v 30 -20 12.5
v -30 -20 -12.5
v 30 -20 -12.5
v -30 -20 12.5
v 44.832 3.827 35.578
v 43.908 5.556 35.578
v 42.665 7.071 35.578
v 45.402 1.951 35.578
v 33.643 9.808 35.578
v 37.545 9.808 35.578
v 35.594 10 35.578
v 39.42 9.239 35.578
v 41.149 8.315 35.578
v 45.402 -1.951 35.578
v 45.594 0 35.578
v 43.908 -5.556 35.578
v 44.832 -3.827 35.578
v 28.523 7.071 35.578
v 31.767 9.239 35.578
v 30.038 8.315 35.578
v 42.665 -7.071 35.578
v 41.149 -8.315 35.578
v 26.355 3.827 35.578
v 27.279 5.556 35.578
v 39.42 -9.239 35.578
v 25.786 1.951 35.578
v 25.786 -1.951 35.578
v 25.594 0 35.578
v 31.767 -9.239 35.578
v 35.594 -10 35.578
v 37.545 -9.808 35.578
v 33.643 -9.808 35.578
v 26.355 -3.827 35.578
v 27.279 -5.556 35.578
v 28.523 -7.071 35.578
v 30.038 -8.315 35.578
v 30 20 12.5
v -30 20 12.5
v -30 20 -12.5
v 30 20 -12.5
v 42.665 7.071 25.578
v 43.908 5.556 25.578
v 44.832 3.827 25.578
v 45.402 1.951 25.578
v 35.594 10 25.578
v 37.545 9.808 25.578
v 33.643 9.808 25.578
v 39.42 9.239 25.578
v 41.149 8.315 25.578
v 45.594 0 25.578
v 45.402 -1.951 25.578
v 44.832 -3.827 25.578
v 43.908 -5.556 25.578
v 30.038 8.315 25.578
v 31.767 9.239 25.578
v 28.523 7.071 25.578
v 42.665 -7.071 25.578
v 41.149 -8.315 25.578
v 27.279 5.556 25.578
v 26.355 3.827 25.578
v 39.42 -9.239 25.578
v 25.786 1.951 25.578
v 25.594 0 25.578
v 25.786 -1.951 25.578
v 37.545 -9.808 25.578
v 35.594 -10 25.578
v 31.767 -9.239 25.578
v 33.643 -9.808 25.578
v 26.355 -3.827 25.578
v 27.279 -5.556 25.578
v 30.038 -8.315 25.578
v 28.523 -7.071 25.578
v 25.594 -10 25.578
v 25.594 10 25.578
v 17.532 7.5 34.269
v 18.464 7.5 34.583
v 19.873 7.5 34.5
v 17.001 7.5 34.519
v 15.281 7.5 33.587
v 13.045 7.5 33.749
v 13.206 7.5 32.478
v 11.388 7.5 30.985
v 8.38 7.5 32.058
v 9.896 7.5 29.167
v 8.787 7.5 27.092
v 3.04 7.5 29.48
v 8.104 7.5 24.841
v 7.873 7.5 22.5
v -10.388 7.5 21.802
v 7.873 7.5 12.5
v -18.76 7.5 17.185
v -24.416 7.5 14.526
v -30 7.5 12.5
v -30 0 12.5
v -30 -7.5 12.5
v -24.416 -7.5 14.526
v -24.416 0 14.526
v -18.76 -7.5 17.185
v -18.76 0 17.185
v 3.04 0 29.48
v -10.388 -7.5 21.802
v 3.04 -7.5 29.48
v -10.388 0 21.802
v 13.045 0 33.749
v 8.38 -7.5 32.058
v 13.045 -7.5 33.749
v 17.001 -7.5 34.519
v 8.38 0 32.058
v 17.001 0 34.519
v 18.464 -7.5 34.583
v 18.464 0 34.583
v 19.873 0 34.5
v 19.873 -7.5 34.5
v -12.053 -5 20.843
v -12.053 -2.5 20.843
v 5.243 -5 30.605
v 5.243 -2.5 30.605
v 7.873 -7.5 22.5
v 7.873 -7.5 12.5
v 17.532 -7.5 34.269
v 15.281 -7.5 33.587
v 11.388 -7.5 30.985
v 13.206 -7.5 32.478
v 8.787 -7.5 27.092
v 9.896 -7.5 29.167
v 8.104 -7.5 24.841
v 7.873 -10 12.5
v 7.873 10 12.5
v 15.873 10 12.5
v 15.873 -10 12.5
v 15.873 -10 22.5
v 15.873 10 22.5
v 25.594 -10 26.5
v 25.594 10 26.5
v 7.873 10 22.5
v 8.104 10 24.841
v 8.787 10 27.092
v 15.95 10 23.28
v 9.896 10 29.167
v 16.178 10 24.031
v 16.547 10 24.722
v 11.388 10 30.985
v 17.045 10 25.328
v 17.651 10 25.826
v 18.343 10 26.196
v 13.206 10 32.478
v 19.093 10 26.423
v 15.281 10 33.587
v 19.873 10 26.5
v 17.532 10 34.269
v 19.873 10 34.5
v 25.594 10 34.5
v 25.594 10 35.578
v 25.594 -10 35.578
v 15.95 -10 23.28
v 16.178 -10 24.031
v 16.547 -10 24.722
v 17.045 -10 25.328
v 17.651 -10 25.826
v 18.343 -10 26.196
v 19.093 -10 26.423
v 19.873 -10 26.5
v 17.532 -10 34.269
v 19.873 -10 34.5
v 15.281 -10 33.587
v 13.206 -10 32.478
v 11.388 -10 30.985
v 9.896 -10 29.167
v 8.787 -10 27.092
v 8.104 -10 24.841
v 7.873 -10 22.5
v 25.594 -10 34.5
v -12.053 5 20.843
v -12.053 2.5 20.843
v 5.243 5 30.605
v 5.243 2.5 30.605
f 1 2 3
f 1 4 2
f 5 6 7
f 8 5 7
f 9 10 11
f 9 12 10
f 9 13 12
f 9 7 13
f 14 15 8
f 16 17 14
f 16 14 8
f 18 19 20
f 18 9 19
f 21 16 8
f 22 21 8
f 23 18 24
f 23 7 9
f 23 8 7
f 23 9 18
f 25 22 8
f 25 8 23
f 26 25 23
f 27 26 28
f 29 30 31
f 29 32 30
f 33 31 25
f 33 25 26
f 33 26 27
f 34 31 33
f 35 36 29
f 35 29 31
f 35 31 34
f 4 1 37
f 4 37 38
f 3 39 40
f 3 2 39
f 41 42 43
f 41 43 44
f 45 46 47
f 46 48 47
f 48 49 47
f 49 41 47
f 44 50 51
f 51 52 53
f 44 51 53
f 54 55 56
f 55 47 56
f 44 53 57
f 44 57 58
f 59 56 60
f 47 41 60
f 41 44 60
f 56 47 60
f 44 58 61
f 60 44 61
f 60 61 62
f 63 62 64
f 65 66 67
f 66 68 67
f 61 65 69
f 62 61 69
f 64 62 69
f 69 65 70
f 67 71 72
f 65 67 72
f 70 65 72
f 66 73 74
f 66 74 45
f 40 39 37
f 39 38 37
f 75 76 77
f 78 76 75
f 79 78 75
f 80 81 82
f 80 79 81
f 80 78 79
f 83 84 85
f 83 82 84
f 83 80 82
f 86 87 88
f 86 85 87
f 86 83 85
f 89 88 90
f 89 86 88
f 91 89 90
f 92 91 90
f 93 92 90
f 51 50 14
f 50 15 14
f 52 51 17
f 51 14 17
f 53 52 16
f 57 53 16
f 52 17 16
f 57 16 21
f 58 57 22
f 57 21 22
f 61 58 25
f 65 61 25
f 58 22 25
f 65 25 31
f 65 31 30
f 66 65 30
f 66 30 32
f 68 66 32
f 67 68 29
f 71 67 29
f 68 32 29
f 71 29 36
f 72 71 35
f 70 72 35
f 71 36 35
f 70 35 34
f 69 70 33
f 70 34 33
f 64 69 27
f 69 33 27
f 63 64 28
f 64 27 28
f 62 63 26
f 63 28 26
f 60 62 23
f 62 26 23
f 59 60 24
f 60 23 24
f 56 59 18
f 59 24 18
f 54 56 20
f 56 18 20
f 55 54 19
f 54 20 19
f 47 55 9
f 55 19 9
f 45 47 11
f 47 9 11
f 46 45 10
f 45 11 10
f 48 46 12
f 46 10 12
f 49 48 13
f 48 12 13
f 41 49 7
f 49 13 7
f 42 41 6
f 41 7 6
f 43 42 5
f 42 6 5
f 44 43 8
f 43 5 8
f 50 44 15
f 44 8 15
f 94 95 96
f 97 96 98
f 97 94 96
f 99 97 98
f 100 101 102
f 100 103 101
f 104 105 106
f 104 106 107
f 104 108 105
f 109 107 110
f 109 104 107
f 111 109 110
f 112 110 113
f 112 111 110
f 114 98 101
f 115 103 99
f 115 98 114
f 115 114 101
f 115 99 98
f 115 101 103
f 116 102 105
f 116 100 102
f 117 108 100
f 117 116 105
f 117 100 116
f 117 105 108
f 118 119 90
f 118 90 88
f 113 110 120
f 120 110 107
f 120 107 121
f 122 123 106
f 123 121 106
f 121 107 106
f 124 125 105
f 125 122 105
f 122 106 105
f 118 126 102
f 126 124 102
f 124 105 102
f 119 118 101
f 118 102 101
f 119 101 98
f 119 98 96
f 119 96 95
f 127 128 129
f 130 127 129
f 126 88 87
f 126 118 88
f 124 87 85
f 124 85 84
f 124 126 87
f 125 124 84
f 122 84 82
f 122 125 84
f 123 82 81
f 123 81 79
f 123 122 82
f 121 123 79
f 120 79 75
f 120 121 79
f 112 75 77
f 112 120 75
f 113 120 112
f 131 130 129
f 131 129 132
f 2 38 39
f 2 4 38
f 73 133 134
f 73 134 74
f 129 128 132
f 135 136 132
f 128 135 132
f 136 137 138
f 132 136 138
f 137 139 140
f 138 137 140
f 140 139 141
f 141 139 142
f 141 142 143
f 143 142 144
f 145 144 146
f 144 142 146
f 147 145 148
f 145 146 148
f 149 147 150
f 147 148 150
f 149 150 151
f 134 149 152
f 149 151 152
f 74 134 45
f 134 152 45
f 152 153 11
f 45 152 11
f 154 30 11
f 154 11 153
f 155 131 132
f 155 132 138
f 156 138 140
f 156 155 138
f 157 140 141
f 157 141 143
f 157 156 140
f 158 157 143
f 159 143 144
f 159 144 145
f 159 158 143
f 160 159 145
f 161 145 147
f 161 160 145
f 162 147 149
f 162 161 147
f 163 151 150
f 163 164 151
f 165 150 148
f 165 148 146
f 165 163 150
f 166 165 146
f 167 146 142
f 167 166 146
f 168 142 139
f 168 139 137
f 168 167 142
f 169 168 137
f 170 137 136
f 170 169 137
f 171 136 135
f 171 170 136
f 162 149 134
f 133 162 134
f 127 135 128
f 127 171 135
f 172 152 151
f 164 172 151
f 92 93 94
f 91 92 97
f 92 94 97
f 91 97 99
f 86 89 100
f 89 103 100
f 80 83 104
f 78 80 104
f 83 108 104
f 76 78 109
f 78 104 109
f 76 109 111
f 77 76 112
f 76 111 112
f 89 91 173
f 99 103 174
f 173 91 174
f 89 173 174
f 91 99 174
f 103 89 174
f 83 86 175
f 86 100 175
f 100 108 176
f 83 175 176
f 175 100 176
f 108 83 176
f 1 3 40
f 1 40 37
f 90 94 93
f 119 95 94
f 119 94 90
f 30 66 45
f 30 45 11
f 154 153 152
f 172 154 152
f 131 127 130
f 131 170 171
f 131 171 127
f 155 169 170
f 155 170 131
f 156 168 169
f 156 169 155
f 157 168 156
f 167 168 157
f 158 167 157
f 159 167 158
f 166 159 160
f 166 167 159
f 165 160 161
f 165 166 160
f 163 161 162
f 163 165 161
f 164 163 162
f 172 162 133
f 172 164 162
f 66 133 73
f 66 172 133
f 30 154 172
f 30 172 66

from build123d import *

# Parameters (mm, degrees)
F1_DEPTH = 20
F2_DEPTH = 10
F3_DEPTH = 7.5
F0_W     = 10
F0_H     = 10


with BuildPart() as f1:
    # F0 (on Front) → F1 (new body, symmetric)
    with BuildSketch(Plane.XZ):
        Polygon((-30, -12.5), (30, -12.5), (30, 12.5), (15.873236, 12.5), (7.873236, 12.5), (-30, 12.5), align=None)
    extrude(amount=F1_DEPTH, both=True)


with BuildPart() as f2:
    # F0 (on Front) → F2 (new body, symmetric)
    with BuildSketch(Plane.XZ):
        with BuildLine():
            Line((7.873236, 12.5), (15.873236, 12.5))
            Line((15.873236, 12.5), (15.873236, 22.5))
            ThreePointArc((15.873236, 22.5), (17.044809, 25.328427), (19.873236, 26.5))
            Line((19.873236, 26.5), (25.593648, 26.5))
            Line((25.593648, 26.5), (25.593648, 34.5))
            Line((25.593648, 34.5), (19.873236, 34.5))
            ThreePointArc((19.873236, 34.5), (11.387954, 30.985281), (7.873236, 22.5))
            Line((7.873236, 22.5), (7.873236, 12.5))
        make_face()
        Polygon((25.593648, 35.578057), (25.593648, 34.5), (25.593648, 26.5), (25.593648, 25.578057), (35.593648, 25.578057), (35.593648, 35.578057), align=None)
    extrude(amount=F2_DEPTH, both=True)


with BuildPart() as f3:
    # F0 (on Front) → F3 (new body, symmetric)
    with BuildSketch(Plane.XZ):
        with BuildLine():
            add(Edge.make_bspline(
                [(-30, 12.5), (-12.397196, 17.705459), (7.245554, 35.966527), (19.873236, 34.5)],
                knots=[0, 0, 0, 0, 54.509996, 54.509996, 54.509996, 54.509996], degree=3))
            Line((-30, 12.5), (7.873236, 12.5))
            Line((7.873236, 12.5), (7.873236, 22.5))
            ThreePointArc((7.873236, 22.5), (11.387954, 30.985281), (19.873236, 34.5))
        make_face()
    extrude(amount=F3_DEPTH, both=True)


with BuildPart() as f4:
    # F0 (on Front) → F4 (revolve)
    with BuildSketch(Plane.XZ):
        with Locations((40.593648, 30.578057)):
            Rectangle(F0_W, F0_H)
    revolve(axis=Axis((35.593648, 0, 30.578057), (0, 0, -1)))


solid = Compound([f1.part, f2.part, f3.part, f4.part])
